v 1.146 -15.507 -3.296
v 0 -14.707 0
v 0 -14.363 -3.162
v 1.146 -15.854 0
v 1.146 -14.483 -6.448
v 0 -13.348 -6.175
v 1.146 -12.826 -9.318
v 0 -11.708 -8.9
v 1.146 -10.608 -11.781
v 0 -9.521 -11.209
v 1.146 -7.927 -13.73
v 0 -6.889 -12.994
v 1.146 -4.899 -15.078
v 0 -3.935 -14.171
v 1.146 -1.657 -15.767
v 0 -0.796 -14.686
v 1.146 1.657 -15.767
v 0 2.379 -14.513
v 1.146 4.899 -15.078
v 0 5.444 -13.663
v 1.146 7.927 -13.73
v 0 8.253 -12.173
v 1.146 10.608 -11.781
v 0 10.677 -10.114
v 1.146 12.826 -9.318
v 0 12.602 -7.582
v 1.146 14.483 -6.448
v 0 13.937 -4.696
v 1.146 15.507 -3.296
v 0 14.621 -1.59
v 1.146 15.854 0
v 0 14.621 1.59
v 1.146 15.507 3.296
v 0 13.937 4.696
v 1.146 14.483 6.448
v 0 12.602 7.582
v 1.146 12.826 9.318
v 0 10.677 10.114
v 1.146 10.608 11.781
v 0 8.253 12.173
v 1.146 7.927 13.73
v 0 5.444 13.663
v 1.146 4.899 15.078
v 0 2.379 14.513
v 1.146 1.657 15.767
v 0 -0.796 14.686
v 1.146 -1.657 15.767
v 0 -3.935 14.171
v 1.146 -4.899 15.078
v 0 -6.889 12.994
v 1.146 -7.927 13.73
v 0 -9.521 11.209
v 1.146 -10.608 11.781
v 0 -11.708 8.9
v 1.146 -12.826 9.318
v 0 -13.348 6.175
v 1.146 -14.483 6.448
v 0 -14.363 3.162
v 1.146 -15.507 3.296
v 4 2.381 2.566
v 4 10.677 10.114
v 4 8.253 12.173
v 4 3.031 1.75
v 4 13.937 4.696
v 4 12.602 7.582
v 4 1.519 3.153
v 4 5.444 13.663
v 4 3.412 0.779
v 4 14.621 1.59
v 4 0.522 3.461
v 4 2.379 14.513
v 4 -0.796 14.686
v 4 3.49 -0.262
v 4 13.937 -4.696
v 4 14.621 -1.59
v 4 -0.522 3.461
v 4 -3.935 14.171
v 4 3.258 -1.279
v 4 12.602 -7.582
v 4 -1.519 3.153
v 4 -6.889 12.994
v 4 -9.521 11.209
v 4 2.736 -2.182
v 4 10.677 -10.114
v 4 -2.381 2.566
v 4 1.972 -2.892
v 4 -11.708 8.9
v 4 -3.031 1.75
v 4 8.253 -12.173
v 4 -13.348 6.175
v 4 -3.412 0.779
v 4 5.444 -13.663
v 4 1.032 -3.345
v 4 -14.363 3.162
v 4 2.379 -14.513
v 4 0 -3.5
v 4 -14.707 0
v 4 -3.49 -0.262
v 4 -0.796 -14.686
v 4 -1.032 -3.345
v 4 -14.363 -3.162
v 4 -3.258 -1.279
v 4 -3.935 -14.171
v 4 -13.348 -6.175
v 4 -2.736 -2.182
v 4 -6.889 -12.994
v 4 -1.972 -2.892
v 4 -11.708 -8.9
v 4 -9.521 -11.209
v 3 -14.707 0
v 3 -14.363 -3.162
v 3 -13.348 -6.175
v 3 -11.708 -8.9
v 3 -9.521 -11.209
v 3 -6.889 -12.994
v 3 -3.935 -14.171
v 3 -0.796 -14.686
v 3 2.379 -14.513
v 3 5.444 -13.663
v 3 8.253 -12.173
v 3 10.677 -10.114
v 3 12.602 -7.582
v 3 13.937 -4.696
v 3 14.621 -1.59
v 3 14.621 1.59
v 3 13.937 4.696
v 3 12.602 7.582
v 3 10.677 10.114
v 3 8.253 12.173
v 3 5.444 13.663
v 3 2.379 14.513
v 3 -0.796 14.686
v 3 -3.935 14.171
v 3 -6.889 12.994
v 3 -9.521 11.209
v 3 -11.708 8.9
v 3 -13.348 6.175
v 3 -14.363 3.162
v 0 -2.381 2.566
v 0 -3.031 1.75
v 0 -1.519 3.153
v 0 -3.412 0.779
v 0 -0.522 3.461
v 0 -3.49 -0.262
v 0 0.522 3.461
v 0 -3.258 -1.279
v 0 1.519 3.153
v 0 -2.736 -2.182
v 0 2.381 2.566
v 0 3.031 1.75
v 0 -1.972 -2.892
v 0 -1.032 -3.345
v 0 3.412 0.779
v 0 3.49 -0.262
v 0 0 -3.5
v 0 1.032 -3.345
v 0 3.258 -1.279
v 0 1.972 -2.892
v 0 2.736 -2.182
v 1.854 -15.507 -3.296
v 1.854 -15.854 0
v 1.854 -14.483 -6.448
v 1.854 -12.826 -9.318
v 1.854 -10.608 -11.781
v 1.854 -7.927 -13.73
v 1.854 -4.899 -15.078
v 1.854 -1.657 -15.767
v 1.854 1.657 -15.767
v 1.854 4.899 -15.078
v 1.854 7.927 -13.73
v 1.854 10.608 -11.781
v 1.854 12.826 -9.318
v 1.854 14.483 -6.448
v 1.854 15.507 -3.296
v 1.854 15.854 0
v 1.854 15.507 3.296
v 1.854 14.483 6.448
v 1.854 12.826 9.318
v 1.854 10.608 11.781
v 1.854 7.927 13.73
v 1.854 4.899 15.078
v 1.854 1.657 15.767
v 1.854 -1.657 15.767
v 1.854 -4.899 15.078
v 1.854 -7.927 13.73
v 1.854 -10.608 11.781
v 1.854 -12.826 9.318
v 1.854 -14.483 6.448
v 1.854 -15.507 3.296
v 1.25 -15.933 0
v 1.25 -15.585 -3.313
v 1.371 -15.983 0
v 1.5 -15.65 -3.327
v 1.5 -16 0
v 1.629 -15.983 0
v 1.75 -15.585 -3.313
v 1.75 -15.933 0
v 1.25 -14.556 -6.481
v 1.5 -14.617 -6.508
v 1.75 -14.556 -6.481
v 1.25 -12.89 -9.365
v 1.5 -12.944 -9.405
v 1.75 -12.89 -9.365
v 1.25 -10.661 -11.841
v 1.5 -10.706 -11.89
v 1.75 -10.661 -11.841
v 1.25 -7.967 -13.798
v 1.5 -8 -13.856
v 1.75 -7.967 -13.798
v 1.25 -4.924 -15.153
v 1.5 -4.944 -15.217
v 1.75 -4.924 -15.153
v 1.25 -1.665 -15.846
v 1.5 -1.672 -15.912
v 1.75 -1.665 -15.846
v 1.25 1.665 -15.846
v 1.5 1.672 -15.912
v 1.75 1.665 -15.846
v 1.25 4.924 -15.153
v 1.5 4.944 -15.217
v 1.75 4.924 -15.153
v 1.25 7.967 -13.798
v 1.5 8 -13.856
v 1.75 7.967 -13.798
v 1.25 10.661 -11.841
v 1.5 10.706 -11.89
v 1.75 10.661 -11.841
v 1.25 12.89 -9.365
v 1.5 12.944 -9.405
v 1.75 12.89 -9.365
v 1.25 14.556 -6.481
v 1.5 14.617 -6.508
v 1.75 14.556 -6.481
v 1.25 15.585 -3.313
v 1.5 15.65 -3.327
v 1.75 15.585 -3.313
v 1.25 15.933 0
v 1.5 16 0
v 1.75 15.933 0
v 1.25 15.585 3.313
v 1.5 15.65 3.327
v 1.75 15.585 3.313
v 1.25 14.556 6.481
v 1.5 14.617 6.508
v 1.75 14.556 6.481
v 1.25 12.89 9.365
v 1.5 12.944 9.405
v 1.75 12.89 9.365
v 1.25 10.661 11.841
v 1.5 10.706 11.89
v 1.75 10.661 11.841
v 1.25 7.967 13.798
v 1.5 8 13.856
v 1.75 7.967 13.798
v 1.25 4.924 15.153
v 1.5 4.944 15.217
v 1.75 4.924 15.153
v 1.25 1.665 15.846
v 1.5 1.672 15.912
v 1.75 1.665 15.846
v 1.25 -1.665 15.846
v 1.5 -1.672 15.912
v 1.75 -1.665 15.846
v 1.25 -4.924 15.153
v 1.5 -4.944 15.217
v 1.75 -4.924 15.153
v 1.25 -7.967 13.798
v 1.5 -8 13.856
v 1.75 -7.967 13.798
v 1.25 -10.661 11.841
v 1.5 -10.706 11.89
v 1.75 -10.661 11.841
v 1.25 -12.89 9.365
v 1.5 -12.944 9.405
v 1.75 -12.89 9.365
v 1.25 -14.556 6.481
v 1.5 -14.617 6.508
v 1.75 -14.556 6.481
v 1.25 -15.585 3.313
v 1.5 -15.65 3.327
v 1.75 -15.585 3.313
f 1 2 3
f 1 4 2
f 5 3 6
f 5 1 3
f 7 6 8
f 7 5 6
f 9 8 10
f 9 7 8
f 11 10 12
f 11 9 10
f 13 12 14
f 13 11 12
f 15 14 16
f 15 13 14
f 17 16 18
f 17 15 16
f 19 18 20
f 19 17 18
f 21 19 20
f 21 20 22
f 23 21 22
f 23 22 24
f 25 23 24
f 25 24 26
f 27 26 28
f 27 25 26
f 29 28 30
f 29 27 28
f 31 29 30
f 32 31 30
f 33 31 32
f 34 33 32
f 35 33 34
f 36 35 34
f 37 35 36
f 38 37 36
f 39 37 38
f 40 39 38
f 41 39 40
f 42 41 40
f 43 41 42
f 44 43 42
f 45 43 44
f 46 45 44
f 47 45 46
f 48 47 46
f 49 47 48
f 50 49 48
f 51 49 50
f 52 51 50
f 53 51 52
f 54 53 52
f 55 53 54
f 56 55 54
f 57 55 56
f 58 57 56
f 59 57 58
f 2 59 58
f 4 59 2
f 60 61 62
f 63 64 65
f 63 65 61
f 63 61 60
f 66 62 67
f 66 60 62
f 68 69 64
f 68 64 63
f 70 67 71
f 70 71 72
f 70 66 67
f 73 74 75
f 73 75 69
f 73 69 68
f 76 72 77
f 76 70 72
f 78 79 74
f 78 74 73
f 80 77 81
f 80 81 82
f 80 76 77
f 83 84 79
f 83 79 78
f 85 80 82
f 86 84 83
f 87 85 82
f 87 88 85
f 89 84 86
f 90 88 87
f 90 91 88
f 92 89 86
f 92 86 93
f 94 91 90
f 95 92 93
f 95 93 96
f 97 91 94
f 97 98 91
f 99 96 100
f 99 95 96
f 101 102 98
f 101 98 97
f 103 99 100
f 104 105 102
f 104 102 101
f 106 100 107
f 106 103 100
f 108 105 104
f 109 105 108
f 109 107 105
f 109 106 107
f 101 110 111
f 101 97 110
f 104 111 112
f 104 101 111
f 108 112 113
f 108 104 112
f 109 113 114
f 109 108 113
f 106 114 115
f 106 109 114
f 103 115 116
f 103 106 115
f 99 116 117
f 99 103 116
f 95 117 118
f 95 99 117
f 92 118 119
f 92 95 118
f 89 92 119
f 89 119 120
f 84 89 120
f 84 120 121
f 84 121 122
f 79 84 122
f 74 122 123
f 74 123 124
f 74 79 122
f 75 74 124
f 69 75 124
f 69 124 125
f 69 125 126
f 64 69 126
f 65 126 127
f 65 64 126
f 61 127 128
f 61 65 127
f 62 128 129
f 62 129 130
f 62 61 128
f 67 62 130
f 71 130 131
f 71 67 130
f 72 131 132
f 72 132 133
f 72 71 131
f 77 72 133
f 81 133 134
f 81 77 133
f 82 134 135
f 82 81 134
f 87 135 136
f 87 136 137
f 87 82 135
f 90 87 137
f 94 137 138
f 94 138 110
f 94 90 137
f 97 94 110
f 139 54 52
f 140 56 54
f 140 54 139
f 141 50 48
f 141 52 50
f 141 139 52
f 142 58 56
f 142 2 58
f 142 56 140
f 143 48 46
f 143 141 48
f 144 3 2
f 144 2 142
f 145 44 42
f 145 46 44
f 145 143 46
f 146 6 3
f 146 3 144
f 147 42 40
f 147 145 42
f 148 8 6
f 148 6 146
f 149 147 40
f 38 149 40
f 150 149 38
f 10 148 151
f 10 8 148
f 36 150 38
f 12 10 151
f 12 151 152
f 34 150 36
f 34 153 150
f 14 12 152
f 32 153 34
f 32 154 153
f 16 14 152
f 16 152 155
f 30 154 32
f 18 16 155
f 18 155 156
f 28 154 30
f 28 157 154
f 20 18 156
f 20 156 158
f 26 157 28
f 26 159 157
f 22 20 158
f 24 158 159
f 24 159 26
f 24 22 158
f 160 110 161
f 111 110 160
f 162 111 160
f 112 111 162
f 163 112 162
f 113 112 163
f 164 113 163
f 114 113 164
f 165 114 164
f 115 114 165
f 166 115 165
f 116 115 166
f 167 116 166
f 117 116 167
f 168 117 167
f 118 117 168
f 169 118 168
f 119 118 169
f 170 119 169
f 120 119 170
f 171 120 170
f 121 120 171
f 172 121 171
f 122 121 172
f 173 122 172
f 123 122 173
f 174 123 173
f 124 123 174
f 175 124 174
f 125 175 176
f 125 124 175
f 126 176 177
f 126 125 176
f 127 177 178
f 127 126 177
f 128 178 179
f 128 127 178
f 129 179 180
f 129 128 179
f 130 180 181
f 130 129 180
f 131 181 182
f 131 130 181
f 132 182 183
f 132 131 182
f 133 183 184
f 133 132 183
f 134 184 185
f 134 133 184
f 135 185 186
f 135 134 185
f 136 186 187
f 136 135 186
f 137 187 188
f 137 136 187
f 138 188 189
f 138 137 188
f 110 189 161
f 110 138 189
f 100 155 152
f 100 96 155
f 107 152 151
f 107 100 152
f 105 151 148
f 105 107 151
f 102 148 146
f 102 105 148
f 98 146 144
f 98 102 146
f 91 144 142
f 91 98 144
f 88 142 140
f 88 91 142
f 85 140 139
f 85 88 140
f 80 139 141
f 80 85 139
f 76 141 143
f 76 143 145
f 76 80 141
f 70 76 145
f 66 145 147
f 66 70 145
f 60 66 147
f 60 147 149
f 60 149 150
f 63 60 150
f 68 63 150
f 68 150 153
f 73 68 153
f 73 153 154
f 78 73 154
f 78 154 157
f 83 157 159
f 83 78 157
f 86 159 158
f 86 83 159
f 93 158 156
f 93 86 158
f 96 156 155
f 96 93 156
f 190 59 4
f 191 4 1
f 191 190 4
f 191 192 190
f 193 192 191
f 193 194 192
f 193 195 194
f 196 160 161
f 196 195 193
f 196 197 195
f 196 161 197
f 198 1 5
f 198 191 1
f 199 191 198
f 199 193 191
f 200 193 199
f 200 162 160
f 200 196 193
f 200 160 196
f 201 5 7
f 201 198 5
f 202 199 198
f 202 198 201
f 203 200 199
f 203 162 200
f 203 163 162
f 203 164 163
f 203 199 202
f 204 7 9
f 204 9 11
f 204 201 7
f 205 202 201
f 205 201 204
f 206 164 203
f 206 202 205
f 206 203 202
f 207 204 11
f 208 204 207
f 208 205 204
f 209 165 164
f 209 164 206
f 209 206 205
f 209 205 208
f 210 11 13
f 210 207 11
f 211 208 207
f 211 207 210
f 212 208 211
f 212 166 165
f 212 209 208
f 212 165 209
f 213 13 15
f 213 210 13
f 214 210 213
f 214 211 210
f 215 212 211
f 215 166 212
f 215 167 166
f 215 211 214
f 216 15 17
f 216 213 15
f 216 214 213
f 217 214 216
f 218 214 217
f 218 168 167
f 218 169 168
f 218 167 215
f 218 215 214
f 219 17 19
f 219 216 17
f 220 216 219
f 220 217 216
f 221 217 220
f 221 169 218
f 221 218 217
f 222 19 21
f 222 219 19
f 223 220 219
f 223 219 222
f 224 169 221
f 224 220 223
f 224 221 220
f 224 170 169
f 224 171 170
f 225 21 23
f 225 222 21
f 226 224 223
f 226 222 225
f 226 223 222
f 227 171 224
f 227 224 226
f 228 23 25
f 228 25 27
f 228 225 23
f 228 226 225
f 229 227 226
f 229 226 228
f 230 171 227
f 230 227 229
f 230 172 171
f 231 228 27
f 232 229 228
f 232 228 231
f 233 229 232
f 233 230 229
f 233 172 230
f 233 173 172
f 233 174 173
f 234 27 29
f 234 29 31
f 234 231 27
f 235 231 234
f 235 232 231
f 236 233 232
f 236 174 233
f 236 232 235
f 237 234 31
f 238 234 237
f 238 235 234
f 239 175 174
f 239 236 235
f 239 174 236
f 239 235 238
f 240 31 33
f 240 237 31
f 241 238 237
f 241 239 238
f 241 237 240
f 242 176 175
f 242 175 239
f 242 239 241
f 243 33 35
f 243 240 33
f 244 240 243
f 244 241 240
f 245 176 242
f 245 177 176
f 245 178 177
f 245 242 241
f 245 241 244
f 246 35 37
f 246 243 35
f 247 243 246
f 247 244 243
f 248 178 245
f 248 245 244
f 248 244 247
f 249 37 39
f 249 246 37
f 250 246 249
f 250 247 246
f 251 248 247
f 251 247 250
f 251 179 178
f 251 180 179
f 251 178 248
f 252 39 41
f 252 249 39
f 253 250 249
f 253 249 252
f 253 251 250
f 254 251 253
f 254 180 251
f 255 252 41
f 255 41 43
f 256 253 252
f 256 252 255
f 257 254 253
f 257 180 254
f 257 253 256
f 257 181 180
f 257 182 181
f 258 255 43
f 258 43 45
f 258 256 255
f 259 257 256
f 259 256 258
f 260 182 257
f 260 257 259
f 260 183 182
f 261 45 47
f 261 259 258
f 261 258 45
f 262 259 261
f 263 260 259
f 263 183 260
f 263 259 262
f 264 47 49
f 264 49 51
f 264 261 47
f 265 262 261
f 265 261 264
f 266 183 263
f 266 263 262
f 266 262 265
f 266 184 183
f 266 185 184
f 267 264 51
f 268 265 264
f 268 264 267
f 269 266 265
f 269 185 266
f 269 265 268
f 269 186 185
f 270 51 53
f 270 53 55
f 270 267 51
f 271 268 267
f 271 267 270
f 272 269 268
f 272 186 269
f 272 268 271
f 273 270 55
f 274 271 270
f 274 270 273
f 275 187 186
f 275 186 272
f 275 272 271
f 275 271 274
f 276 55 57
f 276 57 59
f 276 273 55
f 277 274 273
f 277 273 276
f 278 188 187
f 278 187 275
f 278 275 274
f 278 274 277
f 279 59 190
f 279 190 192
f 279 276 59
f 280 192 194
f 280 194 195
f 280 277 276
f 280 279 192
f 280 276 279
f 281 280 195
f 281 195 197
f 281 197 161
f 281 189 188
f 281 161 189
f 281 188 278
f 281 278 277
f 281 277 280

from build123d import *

# Parameters (mm, degrees)
ESQUISSE6_W = 4
ESQUISSE6_H = 3.5


with BuildPart() as part:
    # Esquisse1 → Révolution1 (revolve)
    with BuildSketch(Plane.XY, mode=Mode.PRIVATE) as r_volution1_sk:
        with BuildLine():
            Line((0, 0), (0, 14.707106781))
            Line((0, 14.707106781), (1.146446609, 15.853553391))
            ThreePointArc((1.146446609, 15.853553391), (1.5, 16), (1.853553391, 15.853553391))
            Line((1.853553391, 15.853553391), (3, 14.707106781))
            Line((3, 14.707106781), (4, 14.707106781))
            Line((4, 14.707106781), (4, 0))
            Line((4, 0), (0, 0))
        make_face()
    revolve(r_volution1_sk.sketch.rotate(Axis((0, 0, 0), (1, 0, 0)), 180), axis=Axis((0, 0, 0), (1, 0, 0)))

    # Esquisse6 → Enlèvement de matière-Révolution1 (revolve, cut)
    with BuildSketch(Plane.XY, mode=Mode.PRIVATE) as enl_vement_de_mati_re_r_volution1_sk:
        with Locations((2, 1.75)):
            Rectangle(ESQUISSE6_W, ESQUISSE6_H)
    revolve(enl_vement_de_mati_re_r_volution1_sk.sketch.rotate(Axis((4, 0, 0), (-1, 0, 0)), 90), axis=Axis((4, 0, 0), (-1, 0, 0)), mode=Mode.SUBTRACT)


solid = part.part
